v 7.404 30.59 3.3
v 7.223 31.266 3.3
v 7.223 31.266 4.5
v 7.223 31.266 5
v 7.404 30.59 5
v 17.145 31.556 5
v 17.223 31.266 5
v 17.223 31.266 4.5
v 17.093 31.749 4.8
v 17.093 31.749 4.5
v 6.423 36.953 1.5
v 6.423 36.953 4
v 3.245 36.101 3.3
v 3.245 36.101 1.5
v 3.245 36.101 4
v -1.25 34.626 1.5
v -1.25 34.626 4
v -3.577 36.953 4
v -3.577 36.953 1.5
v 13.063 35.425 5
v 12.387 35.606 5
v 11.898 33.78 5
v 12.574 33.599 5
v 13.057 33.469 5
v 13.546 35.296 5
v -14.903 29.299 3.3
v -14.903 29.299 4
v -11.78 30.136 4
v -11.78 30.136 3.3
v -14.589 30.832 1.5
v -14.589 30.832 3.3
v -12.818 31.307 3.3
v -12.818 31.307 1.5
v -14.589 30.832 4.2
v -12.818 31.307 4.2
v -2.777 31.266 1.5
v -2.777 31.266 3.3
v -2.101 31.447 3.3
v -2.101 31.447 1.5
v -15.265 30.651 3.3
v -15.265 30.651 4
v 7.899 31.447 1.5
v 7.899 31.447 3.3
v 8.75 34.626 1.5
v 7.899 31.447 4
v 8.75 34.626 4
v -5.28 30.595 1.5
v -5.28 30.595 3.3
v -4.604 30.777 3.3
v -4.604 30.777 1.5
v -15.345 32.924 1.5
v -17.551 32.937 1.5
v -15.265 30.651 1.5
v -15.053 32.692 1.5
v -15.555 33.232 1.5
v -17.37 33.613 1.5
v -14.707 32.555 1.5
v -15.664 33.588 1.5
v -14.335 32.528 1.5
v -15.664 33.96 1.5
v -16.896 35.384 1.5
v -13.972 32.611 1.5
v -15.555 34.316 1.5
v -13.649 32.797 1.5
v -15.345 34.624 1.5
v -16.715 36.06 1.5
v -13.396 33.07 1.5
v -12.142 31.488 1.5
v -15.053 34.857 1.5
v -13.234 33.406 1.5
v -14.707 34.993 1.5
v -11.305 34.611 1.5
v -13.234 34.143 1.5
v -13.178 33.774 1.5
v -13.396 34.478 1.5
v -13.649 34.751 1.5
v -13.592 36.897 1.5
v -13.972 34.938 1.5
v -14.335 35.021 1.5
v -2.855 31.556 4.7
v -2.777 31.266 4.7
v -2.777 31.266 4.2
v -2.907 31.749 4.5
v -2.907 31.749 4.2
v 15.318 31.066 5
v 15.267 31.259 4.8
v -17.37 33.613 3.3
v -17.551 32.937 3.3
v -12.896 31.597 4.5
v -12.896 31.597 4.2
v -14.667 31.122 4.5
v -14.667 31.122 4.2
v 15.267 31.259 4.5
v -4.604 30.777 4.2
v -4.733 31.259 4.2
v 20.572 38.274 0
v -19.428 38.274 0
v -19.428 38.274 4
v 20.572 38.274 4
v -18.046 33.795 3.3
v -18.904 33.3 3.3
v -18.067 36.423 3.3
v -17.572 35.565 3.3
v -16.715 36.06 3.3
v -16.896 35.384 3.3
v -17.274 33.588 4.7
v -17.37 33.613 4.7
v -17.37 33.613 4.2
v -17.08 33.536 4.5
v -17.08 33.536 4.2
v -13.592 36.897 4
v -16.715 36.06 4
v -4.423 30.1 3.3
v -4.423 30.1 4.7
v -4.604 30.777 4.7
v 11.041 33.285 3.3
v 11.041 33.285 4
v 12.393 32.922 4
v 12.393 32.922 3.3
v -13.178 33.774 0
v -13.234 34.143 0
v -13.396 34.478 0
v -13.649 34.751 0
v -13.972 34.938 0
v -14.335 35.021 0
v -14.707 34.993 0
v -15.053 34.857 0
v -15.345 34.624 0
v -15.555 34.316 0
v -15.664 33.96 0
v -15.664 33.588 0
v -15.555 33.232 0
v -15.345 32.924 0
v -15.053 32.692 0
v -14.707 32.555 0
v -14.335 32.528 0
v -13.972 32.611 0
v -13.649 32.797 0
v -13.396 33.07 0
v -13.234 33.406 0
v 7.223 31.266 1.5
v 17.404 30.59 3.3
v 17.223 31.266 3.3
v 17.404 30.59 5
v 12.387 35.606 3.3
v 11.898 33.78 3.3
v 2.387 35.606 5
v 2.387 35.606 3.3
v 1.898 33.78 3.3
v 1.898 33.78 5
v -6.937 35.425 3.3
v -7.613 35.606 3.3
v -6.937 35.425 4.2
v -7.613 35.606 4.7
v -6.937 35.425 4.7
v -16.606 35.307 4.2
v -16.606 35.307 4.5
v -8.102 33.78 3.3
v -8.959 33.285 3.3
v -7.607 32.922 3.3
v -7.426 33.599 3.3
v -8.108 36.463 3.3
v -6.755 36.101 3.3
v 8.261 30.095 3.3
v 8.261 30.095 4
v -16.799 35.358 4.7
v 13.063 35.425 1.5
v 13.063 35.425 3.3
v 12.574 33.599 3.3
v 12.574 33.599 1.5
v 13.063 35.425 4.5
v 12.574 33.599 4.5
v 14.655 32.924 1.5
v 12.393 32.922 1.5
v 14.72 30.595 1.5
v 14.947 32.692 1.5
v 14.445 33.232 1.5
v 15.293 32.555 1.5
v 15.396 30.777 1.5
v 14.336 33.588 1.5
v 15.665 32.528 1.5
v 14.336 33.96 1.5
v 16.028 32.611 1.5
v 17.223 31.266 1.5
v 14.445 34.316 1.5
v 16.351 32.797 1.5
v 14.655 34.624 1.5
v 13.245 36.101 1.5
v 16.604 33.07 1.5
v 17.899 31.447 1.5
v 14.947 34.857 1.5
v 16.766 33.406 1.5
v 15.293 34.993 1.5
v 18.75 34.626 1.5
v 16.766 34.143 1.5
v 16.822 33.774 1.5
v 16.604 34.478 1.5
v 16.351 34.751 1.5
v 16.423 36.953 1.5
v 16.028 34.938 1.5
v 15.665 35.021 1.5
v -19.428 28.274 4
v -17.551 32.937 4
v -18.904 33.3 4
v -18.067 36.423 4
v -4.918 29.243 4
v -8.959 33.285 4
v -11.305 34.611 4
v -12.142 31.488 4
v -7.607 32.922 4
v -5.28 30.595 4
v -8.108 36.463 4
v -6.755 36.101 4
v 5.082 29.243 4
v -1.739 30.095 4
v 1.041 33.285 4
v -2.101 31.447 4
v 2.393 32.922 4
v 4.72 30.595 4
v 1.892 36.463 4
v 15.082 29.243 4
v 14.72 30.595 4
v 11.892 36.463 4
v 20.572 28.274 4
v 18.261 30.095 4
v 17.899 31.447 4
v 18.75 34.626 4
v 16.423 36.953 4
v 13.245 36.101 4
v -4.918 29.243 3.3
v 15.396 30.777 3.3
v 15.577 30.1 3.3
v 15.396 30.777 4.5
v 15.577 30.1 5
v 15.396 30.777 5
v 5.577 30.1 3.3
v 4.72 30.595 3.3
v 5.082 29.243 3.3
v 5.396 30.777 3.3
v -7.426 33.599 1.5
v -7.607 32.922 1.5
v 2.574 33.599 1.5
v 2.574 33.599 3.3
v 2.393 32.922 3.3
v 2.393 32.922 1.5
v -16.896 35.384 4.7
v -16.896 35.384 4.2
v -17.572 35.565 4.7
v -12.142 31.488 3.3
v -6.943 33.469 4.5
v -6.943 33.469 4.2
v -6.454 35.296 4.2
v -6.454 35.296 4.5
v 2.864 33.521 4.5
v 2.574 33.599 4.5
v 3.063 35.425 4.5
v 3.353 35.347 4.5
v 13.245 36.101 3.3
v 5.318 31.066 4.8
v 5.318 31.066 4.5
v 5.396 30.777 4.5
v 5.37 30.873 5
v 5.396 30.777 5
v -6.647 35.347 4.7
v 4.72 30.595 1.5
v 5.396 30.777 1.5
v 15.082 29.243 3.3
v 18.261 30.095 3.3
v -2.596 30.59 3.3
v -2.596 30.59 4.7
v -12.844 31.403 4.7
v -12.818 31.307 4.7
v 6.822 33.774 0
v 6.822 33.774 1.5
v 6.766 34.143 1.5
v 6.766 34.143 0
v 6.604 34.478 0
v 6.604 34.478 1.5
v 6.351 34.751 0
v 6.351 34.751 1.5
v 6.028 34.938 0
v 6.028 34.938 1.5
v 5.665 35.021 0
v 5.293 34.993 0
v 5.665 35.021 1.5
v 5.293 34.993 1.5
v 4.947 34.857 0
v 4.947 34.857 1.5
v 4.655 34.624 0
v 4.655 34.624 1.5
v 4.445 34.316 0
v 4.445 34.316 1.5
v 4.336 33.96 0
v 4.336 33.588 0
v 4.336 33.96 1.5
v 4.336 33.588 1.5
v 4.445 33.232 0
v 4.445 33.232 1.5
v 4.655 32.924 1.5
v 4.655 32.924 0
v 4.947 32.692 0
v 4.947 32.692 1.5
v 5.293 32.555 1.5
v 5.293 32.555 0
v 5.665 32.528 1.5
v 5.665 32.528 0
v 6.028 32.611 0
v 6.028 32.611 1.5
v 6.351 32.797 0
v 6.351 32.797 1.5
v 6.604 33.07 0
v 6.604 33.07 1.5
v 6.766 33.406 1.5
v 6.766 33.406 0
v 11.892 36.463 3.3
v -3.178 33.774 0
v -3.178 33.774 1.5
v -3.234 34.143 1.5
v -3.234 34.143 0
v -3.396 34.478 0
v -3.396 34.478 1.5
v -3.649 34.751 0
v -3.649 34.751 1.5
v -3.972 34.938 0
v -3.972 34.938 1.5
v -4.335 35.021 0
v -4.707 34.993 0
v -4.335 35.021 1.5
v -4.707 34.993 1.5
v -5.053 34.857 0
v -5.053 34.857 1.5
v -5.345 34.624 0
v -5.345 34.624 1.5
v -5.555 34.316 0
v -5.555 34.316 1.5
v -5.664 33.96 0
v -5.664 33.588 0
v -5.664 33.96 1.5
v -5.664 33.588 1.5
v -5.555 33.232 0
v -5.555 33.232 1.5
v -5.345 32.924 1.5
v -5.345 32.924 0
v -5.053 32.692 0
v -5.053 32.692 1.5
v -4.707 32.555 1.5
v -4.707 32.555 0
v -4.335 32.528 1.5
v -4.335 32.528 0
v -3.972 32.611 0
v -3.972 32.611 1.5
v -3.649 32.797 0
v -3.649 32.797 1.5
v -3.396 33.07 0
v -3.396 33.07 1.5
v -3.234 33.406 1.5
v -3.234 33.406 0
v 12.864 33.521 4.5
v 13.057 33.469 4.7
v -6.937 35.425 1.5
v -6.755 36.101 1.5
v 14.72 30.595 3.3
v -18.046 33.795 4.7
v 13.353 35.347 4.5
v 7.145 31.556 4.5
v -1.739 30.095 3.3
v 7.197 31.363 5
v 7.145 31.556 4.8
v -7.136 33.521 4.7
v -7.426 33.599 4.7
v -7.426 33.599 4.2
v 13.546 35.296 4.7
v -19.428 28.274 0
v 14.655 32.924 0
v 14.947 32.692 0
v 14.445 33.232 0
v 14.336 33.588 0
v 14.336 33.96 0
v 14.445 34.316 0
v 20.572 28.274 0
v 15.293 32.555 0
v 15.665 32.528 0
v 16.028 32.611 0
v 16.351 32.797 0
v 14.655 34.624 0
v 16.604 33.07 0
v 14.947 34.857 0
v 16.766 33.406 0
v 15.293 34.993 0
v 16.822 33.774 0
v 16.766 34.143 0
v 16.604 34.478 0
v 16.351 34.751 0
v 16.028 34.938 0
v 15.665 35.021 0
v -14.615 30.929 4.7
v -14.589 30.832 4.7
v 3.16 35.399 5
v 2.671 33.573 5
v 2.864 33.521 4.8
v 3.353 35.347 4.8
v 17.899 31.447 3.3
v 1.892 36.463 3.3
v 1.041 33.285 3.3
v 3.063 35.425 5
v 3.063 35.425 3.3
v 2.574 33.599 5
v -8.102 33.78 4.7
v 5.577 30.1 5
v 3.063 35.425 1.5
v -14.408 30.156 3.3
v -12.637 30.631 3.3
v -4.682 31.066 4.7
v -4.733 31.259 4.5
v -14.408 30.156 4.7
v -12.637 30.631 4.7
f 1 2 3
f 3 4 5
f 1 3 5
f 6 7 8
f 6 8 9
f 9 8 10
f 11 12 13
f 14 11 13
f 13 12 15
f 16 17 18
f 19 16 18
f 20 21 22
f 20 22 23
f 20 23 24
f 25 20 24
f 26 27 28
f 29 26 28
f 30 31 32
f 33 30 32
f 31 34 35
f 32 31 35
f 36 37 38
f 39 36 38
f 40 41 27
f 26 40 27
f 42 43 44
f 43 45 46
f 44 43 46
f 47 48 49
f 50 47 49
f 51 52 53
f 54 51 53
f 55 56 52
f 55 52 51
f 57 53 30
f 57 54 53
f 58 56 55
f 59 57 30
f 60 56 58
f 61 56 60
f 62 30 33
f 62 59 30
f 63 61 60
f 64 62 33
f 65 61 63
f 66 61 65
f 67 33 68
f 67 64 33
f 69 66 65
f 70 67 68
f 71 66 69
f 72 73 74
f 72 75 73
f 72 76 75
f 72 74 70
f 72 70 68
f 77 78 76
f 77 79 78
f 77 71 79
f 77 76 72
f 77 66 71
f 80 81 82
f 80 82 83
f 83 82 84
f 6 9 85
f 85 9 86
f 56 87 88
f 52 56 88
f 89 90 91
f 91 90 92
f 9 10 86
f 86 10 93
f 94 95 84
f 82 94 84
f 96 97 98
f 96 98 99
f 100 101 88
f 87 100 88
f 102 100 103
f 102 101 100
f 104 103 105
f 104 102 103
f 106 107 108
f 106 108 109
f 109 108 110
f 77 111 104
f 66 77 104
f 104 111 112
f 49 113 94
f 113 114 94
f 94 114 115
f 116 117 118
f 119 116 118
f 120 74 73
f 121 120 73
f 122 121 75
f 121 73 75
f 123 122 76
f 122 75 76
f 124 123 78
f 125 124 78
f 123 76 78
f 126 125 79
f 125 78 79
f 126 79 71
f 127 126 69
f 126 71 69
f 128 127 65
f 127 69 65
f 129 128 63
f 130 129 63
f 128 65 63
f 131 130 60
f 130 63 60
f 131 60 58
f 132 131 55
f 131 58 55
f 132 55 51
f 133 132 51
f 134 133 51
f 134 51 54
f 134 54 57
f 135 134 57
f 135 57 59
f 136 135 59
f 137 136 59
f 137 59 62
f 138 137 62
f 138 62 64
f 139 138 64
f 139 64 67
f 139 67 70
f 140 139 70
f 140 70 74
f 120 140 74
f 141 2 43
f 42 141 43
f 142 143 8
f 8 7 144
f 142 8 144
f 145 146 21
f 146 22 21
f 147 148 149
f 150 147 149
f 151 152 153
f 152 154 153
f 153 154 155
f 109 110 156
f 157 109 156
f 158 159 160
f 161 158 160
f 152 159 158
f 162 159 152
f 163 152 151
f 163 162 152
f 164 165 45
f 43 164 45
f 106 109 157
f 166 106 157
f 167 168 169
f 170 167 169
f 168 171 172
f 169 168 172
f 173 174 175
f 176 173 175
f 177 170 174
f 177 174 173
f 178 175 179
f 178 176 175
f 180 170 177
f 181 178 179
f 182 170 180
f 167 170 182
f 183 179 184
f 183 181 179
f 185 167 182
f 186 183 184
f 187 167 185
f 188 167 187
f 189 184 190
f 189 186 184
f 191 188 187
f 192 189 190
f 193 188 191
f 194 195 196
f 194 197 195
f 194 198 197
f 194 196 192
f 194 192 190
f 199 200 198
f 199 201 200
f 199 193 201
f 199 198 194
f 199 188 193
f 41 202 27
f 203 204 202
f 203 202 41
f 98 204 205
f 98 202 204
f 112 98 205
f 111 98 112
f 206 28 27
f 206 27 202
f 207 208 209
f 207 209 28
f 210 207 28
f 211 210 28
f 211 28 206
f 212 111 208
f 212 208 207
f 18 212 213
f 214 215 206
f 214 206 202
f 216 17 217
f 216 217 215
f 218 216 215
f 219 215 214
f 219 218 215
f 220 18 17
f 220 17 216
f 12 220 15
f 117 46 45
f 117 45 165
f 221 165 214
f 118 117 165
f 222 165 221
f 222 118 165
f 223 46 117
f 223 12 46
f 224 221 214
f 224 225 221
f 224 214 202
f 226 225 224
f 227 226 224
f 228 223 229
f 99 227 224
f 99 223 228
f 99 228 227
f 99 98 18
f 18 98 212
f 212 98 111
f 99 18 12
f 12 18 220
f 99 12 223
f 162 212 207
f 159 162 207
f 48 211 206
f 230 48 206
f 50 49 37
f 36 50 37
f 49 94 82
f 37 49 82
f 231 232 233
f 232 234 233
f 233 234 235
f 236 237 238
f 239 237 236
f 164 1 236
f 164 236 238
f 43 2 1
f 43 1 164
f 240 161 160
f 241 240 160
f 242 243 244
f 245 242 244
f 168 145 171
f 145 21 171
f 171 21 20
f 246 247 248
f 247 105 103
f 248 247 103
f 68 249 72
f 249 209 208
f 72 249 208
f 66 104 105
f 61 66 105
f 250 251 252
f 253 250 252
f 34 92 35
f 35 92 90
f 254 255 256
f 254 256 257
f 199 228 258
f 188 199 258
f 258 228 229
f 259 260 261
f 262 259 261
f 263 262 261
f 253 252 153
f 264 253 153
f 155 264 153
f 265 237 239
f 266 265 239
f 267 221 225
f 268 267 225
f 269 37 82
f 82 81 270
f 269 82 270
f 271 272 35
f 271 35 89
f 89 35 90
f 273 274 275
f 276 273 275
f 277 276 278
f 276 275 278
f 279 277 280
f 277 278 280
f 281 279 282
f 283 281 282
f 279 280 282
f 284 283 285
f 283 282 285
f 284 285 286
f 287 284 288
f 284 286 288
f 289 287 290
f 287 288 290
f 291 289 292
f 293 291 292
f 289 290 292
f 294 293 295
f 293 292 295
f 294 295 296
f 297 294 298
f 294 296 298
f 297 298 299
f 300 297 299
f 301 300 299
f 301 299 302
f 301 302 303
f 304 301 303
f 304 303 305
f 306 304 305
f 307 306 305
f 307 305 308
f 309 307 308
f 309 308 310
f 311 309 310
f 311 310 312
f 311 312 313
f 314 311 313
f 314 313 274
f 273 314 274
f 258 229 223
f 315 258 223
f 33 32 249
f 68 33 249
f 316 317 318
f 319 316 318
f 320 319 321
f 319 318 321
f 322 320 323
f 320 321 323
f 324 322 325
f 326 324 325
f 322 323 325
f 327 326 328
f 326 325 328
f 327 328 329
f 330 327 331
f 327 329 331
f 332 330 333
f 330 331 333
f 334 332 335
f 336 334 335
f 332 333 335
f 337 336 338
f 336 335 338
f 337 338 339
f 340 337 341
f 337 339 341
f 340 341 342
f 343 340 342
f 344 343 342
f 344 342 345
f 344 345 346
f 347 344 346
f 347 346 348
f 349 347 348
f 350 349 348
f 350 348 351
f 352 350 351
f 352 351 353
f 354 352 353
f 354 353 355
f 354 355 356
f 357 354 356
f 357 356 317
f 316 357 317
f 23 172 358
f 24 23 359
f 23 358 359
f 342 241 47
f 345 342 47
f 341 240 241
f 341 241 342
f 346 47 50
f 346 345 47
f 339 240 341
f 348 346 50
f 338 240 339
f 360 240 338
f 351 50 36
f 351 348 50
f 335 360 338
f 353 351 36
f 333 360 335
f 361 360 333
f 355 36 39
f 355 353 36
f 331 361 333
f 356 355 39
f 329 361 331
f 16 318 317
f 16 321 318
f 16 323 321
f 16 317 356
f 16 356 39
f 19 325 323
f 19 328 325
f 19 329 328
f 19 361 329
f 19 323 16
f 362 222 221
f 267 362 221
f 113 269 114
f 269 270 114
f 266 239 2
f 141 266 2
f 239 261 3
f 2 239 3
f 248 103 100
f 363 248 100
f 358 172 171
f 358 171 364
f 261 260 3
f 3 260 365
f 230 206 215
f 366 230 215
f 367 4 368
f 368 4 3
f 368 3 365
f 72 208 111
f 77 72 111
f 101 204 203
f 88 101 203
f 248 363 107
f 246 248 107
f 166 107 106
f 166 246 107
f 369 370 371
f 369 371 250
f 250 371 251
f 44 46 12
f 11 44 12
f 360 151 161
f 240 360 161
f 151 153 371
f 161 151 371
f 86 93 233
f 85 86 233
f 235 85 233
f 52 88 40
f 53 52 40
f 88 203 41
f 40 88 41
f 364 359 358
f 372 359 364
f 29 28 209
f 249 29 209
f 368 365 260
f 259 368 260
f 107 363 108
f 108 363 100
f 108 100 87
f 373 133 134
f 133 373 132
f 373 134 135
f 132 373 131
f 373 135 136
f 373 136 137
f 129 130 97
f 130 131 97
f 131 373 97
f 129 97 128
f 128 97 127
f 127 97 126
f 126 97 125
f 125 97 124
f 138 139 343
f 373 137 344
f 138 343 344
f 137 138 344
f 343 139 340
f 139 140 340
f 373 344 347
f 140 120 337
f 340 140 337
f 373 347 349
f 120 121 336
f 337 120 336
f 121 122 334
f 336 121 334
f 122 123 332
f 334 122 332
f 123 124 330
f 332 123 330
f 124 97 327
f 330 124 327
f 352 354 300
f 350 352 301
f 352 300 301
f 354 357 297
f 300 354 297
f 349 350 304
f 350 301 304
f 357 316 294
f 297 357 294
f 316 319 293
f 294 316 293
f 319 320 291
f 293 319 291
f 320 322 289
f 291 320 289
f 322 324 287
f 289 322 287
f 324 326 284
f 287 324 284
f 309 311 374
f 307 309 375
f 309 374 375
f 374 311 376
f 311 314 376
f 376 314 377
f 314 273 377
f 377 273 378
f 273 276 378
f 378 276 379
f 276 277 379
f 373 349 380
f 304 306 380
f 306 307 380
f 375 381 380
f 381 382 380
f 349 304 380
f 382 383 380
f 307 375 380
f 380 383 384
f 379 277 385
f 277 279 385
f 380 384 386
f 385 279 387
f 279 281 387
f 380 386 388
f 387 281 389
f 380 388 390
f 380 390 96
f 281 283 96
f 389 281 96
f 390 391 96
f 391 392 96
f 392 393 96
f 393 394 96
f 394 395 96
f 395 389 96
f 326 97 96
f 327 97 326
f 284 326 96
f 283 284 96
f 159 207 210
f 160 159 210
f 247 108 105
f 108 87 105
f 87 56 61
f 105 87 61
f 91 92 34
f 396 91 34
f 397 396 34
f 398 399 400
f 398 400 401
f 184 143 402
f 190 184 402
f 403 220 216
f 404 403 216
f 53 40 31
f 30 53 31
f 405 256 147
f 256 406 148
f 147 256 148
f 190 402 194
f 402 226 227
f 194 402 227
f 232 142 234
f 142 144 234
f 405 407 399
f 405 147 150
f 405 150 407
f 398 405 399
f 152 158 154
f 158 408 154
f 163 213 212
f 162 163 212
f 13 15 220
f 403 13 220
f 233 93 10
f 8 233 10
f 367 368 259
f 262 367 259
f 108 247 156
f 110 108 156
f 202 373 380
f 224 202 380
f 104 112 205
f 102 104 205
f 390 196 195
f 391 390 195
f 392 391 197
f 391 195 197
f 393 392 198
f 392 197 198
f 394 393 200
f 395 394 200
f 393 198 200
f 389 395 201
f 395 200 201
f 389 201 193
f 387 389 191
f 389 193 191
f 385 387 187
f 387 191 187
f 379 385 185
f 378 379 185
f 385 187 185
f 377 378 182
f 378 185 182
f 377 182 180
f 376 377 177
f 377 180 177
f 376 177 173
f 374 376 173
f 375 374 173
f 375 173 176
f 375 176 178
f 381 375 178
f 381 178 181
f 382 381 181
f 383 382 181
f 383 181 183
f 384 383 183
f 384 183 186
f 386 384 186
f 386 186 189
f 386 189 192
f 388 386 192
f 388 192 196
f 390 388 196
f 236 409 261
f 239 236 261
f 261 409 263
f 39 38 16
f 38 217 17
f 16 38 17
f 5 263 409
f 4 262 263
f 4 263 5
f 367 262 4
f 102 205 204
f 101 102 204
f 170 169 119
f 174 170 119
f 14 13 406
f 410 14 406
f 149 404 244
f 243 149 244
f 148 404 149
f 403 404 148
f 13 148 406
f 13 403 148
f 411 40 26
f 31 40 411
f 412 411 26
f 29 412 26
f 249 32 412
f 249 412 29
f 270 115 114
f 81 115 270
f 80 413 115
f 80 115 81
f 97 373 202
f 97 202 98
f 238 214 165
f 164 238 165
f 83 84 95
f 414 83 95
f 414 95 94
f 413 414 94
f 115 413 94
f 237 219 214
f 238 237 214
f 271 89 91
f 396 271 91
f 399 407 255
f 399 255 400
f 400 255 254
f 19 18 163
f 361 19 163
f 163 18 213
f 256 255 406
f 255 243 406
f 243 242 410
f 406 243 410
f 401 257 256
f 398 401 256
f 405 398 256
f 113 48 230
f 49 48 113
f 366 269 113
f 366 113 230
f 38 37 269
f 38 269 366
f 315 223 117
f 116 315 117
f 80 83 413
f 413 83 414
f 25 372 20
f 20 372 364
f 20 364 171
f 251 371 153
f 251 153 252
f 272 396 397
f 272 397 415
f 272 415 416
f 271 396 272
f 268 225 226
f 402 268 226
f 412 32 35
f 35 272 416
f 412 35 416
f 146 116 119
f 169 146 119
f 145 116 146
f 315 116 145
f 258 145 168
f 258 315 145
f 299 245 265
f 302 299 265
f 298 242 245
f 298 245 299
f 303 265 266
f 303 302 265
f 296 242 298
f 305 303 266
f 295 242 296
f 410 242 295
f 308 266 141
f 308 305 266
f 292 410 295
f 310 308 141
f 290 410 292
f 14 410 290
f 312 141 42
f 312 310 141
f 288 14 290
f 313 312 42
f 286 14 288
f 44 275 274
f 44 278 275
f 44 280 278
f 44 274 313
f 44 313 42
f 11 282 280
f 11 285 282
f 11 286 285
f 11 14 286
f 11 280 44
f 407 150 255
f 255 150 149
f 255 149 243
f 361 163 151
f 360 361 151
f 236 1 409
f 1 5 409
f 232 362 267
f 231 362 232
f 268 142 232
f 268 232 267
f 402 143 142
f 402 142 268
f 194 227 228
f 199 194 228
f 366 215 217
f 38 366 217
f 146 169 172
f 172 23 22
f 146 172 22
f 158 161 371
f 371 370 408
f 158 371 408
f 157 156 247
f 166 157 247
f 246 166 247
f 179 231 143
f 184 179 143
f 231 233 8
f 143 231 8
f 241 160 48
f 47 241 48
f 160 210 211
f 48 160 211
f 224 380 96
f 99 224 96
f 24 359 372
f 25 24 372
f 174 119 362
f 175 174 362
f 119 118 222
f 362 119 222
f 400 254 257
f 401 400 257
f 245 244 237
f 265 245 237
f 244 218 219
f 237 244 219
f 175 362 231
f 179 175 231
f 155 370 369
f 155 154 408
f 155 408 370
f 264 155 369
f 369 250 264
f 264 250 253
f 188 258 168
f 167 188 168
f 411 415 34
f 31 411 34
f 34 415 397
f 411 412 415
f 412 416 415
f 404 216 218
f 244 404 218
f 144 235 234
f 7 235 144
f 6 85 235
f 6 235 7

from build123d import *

# Parameters (mm, degrees)
F0_W      = 40
F0_H      = 10
F1_DEPTH  = 4
F2_R      = 1.25
F3_DEPTH  = 2.5
F4_DEPTH  = 0.7
F5_DEPTH  = 0.2
F6_DEPTH  = 0.5
F7_DEPTH  = 25
F9_DEPTH  = 0.5
F11_DEPTH = 0.5
F12_SIZE  = 0.2


with BuildPart() as f1:
    # F0 (on Top) → F1 (new body)
    with BuildSketch(Plane.XY):
        with Locations((0.5716348439, 33.2741251273)):
            Rectangle(F0_W, F0_H)
    extrude(amount=F1_DEPTH)

    # F2 (on face) → F3 (cut)
    with BuildSketch(Plane.XY.offset(4)):
        Polygon((-17.5513593567, 32.9373213533), (-15.2651689301, 30.6511309267), (-14.5890208517, 30.8323042582), (-14.6666665652, 31.1220820061), (-12.8959685214, 31.596539117), (-12.8183228079, 31.3067613691), (-12.1421747295, 31.4879347007), (-11.3053709554, 34.6109289013), (-13.591561382, 36.8971193279), (-16.7145555827, 36.0603155539), (-16.8957289142, 35.3841674755), (-16.6059511663, 35.3065217619), (-17.0804082772, 33.5358237181), (-17.3701860251, 33.6134694317), align=None)
        with Locations((-14.4283651561, 33.7741251273)):
            Circle(F2_R, mode=Mode.SUBTRACT)
        Polygon((-14.6666665652, 31.1220820061), (-14.5890208517, 30.8323042582), (-12.8183228079, 31.3067613691), (-12.8959685214, 31.596539117), align=None)
        Polygon((-16.8957289142, 35.3841674755), (-17.3701860251, 33.6134694317), (-17.0804082772, 33.5358237181), (-16.6059511663, 35.3065217619), align=None)
        Polygon((-7.6071271103, 32.9223784287), (-5.2801118546, 30.5953631731), (-4.6039637762, 30.7765365046), (-4.7074913943, 31.1629068352), (-2.8810255969, 31.6523068706), (-2.7774979788, 31.2659365401), (-2.1013499004, 31.4471098716), (-1.2496032019, 34.6258718258), (-3.5766184575, 36.9528870815), (-6.7553804117, 36.1011403829), (-6.9365537433, 35.4249923045), (-6.5501834128, 35.3214646865), (-7.0395834482, 33.4949988891), (-7.4259537787, 33.5985265071), align=None)
        with Locations((-4.4283651561, 33.7741251273)):
            Circle(F2_R, mode=Mode.SUBTRACT)
        Polygon((-4.7074913943, 31.1629068352), (-4.6039637762, 30.7765365046), (-2.7774979788, 31.2659365401), (-2.8810255969, 31.6523068706), align=None)
        Polygon((-6.9365537433, 35.4249923045), (-7.4259537787, 33.5985265071), (-7.0395834482, 33.4949988891), (-6.5501834128, 35.3214646865), align=None)
        Polygon((2.3928728897, 32.9223784287), (4.7198881454, 30.5953631731), (5.3960362238, 30.7765365046), (5.2925086057, 31.1629068352), (7.1189744031, 31.6523068706), (7.2225020212, 31.2659365401), (7.8986500996, 31.4471098716), (8.7503967981, 34.6258718258), (6.4233815425, 36.9528870815), (3.2446195883, 36.1011403829), (3.0634462567, 35.4249923045), (3.4498165872, 35.3214646865), (2.9604165518, 33.4949988891), (2.5740462213, 33.5985265071), align=None)
        with Locations((5.5716348439, 33.7741251273)):
            Circle(F2_R, mode=Mode.SUBTRACT)
        Polygon((3.0634462567, 35.4249923045), (2.5740462213, 33.5985265071), (2.9604165518, 33.4949988891), (3.4498165872, 35.3214646865), align=None)
        Polygon((5.2925086057, 31.1629068352), (5.3960362238, 30.7765365046), (7.2225020212, 31.2659365401), (7.1189744031, 31.6523068706), align=None)
        Polygon((12.3928728897, 32.9223784287), (14.7198881454, 30.5953631731), (15.3960362238, 30.7765365046), (15.2666267012, 31.2594994178), (17.0930924986, 31.7488994532), (17.2225020212, 31.2659365401), (17.8986500996, 31.4471098716), (18.7503967981, 34.6258718258), (16.4233815425, 36.9528870815), (13.2446195883, 36.1011403829), (13.0634462567, 35.4249923045), (13.5464091699, 35.295582782), (13.0570091345, 33.4691169846), (12.5740462213, 33.5985265071), align=None)
        with Locations((15.5716348439, 33.7741251273)):
            Circle(F2_R, mode=Mode.SUBTRACT)
        Polygon((15.2666267012, 31.2594994178), (15.3960362238, 30.7765365046), (17.2225020212, 31.2659365401), (17.0930924986, 31.7488994532), align=None)
        Polygon((13.0634462567, 35.4249923045), (12.5740462213, 33.5985265071), (13.0570091345, 33.4691169846), (13.5464091699, 35.295582782), align=None)
    extrude(amount=-F3_DEPTH, mode=Mode.SUBTRACT)

    # F2 (on face) → F4 (cut)
    with BuildSketch(Plane.XY.offset(4)):
        Polygon((-18.9036555135, 33.2996680164), (-17.5513593567, 32.9373213533), (-17.3701860251, 33.6134694317), (-18.0463341035, 33.7946427632), (-17.5718769926, 35.565340807), (-16.8957289142, 35.3841674755), (-16.7145555827, 36.0603155539), (-18.0668517395, 36.422662217), align=None)
        Polygon((-14.5890208517, 30.8323042582), (-15.2651689301, 30.6511309267), (-14.9028222669, 29.2988347699), (-11.7798280663, 30.1356385439), (-12.1421747295, 31.4879347007), (-12.8183228079, 31.3067613691), (-12.6371494763, 30.6306132907), (-14.4078475201, 30.1561561798), align=None)
        Polygon((-4.6039637762, 30.7765365046), (-5.2801118546, 30.5953631731), (-4.9177651915, 29.2430670163), (-1.7390032373, 30.0948137148), (-2.1013499004, 31.4471098716), (-2.7774979788, 31.2659365401), (-2.5963246472, 30.5897884617), (-4.4227904446, 30.1003884262), align=None)
        Polygon((-8.9594232671, 33.2847250919), (-7.6071271103, 32.9223784287), (-7.4259537787, 33.5985265071), (-8.1021018571, 33.7796998387), (-7.6127018217, 35.6061656361), (-6.9365537433, 35.4249923045), (-6.7553804117, 36.1011403829), (-8.1076765685, 36.4634870461), align=None)
        Polygon((1.0405767329, 33.2847250919), (2.3928728897, 32.9223784287), (2.5740462213, 33.5985265071), (1.8978981429, 33.7796998387), (2.3872981783, 35.6061656361), (3.0634462567, 35.4249923045), (3.2446195883, 36.1011403829), (1.8923234315, 36.4634870461), align=None)
        Polygon((5.3960362238, 30.7765365046), (4.7198881454, 30.5953631731), (5.0822348085, 29.2430670163), (8.2609967627, 30.0948137148), (7.8986500996, 31.4471098716), (7.2225020212, 31.2659365401), (7.4036753528, 30.5897884617), (5.5772095554, 30.1003884262), align=None)
        Polygon((15.3960362238, 30.7765365046), (14.7198881454, 30.5953631731), (15.0822348085, 29.2430670163), (18.2609967627, 30.0948137148), (17.8986500996, 31.4471098716), (17.2225020212, 31.2659365401), (17.4036753528, 30.5897884617), (15.5772095554, 30.1003884262), align=None)
        Polygon((11.0405767329, 33.2847250919), (12.3928728897, 32.9223784287), (12.5740462213, 33.5985265071), (11.8978981429, 33.7796998387), (12.3872981783, 35.6061656361), (13.0634462567, 35.4249923045), (13.2446195883, 36.1011403829), (11.8923234315, 36.4634870461), align=None)
    extrude(amount=-F4_DEPTH, mode=Mode.SUBTRACT)

    # F2 (on face) → F5 (join)
    with BuildSketch(Plane.XY.offset(4)):
        Polygon((-18.0463341035, 33.7946427632), (-17.3701860251, 33.6134694317), (-16.8957289142, 35.3841674755), (-17.5718769926, 35.565340807), align=None)
        Polygon((-12.8183228079, 31.3067613691), (-14.5890208517, 30.8323042582), (-14.4078475201, 30.1561561798), (-12.6371494763, 30.6306132907), align=None)
        Polygon((-2.7774979788, 31.2659365401), (-4.6039637762, 30.7765365046), (-4.4227904446, 30.1003884262), (-2.5963246472, 30.5897884617), align=None)
        Polygon((-8.1021018571, 33.7796998387), (-7.4259537787, 33.5985265071), (-6.9365537433, 35.4249923045), (-7.6127018217, 35.6061656361), align=None)
    extrude(amount=F5_DEPTH)

    # F2 (on face) → F6 (join)
    with BuildSketch(Plane.XY.offset(4)):
        Polygon((1.8978981429, 33.7796998387), (2.5740462213, 33.5985265071), (3.0634462567, 35.4249923045), (2.3872981783, 35.6061656361), align=None)
        Polygon((7.2225020212, 31.2659365401), (5.3960362238, 30.7765365046), (5.5772095554, 30.1003884262), (7.4036753528, 30.5897884617), align=None)
        Polygon((11.8978981429, 33.7796998387), (12.5740462213, 33.5985265071), (13.0634462567, 35.4249923045), (12.3872981783, 35.6061656361), align=None)
        Polygon((17.2225020212, 31.2659365401), (15.3960362238, 30.7765365046), (15.5772095554, 30.1003884262), (17.4036753528, 30.5897884617), align=None)
    extrude(amount=F6_DEPTH)

    # F7 (cut): faces of the model
    f7_faces = [f1.faces().sort_by_distance(p)[0] for p in [
        (-14.4283651561, 33.7741251273, 4),
        (-4.4283651561, 33.7741251273, 4),
        (5.5716348439, 33.7741251273, 4),
        (15.5716348439, 33.7741251273, 4),
    ]]
    extrude(f7_faces, amount=-F7_DEPTH, mode=Mode.SUBTRACT)

    # F8 (on face) → F9 (join)
    with BuildSketch(Plane.XY.offset(4.2)):
        Polygon((-17.5718769926, 35.565340807), (-18.0463341035, 33.7946427632), (-17.3701860251, 33.6134694317), (-16.8957289142, 35.3841674755), align=None)
        Polygon((-16.8957289142, 35.3841674755), (-17.3701860251, 33.6134694317), (-17.0804082772, 33.5358237181), (-16.6059511663, 35.3065217619), align=None)
        Polygon((-14.5890208517, 30.8323042582), (-14.4078475201, 30.1561561798), (-12.6371494763, 30.6306132907), (-12.8183228079, 31.3067613691), (-12.8959685214, 31.596539117), (-14.6666665652, 31.1220820061), align=None)
        Polygon((-7.6127018217, 35.6061656361), (-8.1021018571, 33.7796998387), (-7.4259537787, 33.5985265071), (-6.9365537433, 35.4249923045), align=None)
        Polygon((-6.9365537433, 35.4249923045), (-7.4259537787, 33.5985265071), (-6.9429908655, 33.4691169846), (-6.4535908301, 35.295582782), align=None)
        Polygon((-4.6039637762, 30.7765365046), (-4.4227904446, 30.1003884262), (-2.5963246472, 30.5897884617), (-2.7774979788, 31.2659365401), align=None)
        Polygon((-4.7333732988, 31.2594994178), (-4.6039637762, 30.7765365046), (-2.7774979788, 31.2659365401), (-2.9069075014, 31.7488994532), align=None)
    extrude(amount=F9_DEPTH)

    # F10 (on face) → F11 (join)
    with BuildSketch(Plane.XY.offset(4.5)):
        Polygon((2.3872981783, 35.6061656361), (1.8978981429, 33.7796998387), (2.5740462213, 33.5985265071), (3.0634462567, 35.4249923045), align=None)
        Polygon((3.0634462567, 35.4249923045), (2.5740462213, 33.5985265071), (2.8638239692, 33.5208807936), (3.3532240046, 35.347346591), align=None)
        Polygon((5.3960362238, 30.7765365046), (5.5772095554, 30.1003884262), (7.4036753528, 30.5897884617), (7.2225020212, 31.2659365401), align=None)
        Polygon((5.3183905103, 31.0663142525), (5.3960362238, 30.7765365046), (7.2225020212, 31.2659365401), (7.1448563077, 31.5557142879), align=None)
        Polygon((12.3872981783, 35.6061656361), (11.8978981429, 33.7796998387), (12.5740462213, 33.5985265071), (13.0634462567, 35.4249923045), align=None)
        Polygon((13.0634462567, 35.4249923045), (12.5740462213, 33.5985265071), (13.0570091345, 33.4691169846), (13.5464091699, 35.295582782), align=None)
        Polygon((15.3960362238, 30.7765365046), (15.5772095554, 30.1003884262), (17.4036753528, 30.5897884617), (17.2225020212, 31.2659365401), align=None)
        Polygon((15.2666267012, 31.2594994178), (15.3960362238, 30.7765365046), (17.2225020212, 31.2659365401), (17.0930924986, 31.7488994532), align=None)
    extrude(amount=F11_DEPTH)

    # F12
    f12_edges = [f1.edges().sort_by_distance(p)[0] for p in [
        (-16.84318, 34.421173, 4.7),
        (-13.781318, 31.359311, 4.7),
        (-6.698291, 34.38235, 4.7),
        (-3.82014, 31.504199, 4.7),
        (3.108524, 34.434114, 5),
        (6.231623, 31.311014, 5),
        (13.301709, 34.38235, 4.5),
        (16.17986, 31.504199, 5),
    ]]
    chamfer(f12_edges, length=F12_SIZE)


solid = f1.part
